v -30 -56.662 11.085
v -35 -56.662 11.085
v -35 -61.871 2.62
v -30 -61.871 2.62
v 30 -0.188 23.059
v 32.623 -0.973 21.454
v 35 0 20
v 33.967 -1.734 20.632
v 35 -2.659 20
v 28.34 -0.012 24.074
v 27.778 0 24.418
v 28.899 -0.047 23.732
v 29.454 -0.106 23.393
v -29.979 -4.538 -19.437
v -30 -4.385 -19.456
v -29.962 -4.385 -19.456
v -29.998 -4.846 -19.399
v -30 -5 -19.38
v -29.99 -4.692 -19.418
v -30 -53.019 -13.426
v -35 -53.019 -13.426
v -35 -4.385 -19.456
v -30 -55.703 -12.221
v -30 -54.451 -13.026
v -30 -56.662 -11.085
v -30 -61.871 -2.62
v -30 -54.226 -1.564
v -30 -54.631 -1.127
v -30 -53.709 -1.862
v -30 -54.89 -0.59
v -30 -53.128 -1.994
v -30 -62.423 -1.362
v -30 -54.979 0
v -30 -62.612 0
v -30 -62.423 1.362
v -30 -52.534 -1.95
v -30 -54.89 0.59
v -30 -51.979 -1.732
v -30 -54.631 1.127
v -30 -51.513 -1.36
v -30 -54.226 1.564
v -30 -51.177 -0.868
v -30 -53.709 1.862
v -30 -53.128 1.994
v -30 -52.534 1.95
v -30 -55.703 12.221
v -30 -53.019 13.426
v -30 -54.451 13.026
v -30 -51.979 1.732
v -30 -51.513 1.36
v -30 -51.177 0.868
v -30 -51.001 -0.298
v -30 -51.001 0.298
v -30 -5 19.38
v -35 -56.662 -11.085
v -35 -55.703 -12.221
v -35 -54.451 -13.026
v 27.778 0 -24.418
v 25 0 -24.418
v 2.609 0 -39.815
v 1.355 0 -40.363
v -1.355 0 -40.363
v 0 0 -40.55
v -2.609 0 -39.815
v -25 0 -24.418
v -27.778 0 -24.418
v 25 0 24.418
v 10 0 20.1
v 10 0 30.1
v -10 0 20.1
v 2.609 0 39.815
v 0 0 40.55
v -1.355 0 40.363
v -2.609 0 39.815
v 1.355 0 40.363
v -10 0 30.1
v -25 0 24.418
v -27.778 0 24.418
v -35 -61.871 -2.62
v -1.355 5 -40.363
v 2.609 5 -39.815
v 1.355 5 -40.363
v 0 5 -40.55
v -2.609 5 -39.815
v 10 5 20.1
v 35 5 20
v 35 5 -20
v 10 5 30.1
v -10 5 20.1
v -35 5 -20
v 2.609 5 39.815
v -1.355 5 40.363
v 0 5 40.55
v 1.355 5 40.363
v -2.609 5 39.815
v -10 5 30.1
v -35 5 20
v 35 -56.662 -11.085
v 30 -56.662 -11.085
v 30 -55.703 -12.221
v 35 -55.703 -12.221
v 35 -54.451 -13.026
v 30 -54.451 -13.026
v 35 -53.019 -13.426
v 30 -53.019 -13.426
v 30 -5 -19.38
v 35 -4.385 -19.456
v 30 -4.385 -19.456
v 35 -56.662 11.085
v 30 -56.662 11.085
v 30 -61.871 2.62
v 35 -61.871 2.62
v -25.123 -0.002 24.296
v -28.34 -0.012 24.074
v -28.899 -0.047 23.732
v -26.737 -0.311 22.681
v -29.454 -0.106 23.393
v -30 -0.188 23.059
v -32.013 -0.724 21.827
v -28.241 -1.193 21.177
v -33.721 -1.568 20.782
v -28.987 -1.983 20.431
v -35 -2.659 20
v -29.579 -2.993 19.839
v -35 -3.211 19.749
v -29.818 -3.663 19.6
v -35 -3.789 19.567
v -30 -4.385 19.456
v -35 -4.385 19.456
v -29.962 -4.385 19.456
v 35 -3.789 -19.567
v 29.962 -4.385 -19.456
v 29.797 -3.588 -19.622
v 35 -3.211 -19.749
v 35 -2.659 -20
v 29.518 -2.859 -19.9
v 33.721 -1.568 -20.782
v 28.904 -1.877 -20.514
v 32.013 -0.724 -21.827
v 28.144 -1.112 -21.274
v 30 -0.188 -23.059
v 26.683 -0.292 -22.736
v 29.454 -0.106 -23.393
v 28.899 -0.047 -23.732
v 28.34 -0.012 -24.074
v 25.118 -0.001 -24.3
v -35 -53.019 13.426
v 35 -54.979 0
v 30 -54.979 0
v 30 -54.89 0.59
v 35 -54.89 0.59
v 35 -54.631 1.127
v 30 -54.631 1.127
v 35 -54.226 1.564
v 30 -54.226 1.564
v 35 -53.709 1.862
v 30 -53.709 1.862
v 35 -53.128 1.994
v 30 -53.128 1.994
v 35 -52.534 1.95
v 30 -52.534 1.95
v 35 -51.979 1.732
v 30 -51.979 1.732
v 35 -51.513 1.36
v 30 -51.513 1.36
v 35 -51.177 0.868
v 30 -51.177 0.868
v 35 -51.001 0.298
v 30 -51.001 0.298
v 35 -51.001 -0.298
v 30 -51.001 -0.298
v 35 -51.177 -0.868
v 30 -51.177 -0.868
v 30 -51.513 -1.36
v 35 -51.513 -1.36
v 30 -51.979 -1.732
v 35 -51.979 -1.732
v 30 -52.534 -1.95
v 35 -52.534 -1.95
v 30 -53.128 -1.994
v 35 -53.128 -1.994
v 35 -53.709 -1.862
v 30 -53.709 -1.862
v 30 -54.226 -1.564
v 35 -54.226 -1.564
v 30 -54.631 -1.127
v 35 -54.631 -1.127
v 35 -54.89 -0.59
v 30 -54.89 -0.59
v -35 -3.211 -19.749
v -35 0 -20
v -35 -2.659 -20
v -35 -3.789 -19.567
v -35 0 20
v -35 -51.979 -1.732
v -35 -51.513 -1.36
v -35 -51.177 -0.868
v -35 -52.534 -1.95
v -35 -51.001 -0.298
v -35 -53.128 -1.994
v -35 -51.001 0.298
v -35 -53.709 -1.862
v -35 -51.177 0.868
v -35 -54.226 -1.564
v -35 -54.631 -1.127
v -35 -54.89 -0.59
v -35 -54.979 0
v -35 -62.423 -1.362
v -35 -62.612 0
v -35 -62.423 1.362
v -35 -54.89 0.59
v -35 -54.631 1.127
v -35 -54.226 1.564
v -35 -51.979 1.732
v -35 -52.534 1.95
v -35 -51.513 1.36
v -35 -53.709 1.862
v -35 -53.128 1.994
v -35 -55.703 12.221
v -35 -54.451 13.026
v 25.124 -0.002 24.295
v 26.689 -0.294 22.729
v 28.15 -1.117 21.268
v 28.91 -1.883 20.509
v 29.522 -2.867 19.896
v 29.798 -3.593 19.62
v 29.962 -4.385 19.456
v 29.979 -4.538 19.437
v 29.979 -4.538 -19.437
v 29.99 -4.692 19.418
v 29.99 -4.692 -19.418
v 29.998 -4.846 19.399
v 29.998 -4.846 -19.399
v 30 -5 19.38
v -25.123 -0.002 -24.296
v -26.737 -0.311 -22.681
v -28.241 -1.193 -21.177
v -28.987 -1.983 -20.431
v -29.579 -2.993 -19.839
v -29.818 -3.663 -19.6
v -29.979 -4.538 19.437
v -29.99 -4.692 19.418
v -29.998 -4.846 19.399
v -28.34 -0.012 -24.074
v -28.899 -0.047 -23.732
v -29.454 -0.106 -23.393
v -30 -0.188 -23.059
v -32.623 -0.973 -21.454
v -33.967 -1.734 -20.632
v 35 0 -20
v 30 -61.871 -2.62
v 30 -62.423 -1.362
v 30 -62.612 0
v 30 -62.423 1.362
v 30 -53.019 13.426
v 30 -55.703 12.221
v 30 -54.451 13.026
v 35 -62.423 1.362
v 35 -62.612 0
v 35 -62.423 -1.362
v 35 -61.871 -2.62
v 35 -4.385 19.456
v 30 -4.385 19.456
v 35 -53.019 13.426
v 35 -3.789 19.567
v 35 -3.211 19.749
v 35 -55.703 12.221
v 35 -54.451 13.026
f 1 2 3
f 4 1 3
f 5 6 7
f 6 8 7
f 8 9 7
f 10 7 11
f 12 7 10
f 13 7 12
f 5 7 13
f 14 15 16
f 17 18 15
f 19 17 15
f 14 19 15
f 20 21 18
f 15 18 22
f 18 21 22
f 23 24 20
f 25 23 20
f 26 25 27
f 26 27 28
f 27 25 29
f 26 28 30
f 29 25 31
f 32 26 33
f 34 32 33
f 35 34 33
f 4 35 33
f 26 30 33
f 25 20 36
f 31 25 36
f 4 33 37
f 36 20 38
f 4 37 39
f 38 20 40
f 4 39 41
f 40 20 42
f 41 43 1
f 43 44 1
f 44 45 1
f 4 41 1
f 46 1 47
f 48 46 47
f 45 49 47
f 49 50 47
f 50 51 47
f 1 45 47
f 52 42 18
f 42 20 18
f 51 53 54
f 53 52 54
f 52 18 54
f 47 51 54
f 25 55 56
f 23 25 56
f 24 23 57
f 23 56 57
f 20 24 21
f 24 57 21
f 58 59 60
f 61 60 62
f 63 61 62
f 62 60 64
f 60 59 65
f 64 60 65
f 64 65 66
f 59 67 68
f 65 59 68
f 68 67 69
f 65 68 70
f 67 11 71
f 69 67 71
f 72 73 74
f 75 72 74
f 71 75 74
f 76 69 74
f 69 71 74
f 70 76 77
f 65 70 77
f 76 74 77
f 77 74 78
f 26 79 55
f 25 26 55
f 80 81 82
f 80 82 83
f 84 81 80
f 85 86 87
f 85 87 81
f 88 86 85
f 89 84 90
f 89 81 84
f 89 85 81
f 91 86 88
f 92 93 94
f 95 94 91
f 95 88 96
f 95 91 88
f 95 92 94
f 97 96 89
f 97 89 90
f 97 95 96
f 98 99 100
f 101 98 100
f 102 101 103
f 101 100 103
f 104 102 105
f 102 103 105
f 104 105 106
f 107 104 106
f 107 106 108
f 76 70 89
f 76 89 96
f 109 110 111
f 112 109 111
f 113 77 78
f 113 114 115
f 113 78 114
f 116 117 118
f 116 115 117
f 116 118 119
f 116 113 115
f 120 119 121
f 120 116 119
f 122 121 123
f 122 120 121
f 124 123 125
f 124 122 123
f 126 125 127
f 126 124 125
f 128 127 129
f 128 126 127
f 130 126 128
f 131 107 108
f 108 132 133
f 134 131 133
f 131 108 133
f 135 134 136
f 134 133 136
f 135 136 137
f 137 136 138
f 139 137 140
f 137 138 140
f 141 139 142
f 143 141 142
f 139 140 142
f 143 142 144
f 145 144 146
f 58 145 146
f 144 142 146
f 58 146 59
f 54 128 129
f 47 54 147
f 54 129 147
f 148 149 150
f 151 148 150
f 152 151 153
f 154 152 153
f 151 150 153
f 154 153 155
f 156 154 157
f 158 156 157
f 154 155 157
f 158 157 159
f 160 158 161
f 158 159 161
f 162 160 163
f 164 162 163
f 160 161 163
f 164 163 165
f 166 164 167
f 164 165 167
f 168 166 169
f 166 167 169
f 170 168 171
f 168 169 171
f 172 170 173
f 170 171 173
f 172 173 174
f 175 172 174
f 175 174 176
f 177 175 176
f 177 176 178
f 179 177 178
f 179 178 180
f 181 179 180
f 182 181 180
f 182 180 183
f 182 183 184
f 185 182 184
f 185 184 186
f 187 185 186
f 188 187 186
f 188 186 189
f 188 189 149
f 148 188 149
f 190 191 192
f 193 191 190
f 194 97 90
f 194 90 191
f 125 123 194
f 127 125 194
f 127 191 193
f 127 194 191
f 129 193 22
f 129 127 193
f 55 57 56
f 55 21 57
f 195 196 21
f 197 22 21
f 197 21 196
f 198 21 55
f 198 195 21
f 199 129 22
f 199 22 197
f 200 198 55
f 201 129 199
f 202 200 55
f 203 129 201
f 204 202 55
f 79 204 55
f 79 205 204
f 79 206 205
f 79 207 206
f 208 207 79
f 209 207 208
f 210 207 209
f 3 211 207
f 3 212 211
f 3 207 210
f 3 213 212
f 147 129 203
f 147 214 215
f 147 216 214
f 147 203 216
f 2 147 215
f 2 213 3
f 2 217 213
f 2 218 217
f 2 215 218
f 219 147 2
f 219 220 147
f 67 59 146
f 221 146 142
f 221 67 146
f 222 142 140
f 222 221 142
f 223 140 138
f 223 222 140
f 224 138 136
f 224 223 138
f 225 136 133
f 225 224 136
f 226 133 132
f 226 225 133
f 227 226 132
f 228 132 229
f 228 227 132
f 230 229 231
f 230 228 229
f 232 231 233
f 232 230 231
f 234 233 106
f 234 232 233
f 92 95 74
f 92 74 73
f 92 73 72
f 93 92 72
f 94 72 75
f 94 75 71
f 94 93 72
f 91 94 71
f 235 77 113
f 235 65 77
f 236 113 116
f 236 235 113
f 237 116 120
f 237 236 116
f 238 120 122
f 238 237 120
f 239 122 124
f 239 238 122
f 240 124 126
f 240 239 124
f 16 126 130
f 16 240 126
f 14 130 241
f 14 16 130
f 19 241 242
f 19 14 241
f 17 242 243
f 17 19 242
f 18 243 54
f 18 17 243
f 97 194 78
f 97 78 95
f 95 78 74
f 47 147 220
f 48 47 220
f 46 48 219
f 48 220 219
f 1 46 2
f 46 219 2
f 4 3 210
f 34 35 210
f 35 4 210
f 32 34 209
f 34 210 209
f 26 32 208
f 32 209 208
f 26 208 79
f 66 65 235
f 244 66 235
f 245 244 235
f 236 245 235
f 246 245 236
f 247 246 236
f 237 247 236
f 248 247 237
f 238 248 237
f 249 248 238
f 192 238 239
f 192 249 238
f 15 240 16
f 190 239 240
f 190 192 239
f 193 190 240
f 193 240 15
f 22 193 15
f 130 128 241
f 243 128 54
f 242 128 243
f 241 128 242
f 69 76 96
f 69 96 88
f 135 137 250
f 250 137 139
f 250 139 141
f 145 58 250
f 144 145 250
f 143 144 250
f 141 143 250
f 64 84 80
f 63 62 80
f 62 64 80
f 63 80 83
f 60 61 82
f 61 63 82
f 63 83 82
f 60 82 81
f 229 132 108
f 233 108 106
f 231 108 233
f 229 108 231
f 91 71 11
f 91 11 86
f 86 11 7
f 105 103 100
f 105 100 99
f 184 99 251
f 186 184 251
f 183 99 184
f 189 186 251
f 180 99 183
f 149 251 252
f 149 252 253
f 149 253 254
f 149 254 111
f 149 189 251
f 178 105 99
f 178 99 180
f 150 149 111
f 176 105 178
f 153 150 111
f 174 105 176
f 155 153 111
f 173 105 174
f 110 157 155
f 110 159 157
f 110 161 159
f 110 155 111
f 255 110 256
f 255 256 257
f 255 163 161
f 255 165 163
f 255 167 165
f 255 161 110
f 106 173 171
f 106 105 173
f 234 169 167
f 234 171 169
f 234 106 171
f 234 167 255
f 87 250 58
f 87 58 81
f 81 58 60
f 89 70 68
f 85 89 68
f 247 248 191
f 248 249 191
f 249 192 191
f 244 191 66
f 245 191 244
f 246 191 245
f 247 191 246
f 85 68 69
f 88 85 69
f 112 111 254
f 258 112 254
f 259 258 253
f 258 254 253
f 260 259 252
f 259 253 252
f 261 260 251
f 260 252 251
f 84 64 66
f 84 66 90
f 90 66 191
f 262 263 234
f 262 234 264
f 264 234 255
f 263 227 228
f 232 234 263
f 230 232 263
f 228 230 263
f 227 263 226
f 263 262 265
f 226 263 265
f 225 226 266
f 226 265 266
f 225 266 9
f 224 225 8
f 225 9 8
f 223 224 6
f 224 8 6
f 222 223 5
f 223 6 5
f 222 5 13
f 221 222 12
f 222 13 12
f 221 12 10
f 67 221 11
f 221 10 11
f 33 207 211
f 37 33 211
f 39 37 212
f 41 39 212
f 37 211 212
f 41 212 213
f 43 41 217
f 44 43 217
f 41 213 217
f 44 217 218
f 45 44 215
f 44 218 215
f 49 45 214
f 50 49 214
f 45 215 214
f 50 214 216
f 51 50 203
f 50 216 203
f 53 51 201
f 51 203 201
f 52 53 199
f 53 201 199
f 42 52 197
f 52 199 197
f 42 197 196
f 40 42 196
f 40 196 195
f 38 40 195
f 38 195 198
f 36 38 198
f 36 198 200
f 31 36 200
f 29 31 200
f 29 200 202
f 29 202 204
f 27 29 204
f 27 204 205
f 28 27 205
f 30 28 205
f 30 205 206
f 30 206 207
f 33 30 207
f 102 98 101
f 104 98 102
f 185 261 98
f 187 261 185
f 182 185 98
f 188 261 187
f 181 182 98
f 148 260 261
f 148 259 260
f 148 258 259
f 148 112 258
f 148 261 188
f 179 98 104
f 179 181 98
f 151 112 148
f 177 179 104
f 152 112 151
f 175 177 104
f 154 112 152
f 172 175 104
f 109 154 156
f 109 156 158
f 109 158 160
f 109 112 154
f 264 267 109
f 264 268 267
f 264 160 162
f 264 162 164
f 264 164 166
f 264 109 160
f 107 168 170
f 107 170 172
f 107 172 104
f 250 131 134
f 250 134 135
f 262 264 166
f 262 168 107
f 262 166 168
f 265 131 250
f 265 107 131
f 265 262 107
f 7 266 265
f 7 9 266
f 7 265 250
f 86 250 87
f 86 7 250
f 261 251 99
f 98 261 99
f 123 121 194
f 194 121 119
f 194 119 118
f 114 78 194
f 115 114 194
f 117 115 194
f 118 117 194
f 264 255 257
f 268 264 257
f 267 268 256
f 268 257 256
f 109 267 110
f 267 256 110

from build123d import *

# Parameters (mm, degrees)
F0_W         = 5
F0_H         = 40
F1_DEPTH     = 70
F3_DEPTH     = 5
F4_R         = 2
F5_DEPTH     = 97.2
F7_DEPTH     = 83.6
F8_T4_DEPTH  = 65
F8_T10_DEPTH = 65
F8_T16_DEPTH = 5
F8_T21_DEPTH = 5
F8_T26_DEPTH = 5
F8_T31_DEPTH = 5
F8_T37_DEPTH = 16.0458347789
F8_T42_DEPTH = 65
F8_T50_DEPTH = 16.0458347789
F8_T55_DEPTH = 65
F8_T63_DEPTH = 16.0458347789
F8_T68_DEPTH = 65
F8_T76_DEPTH = 65
F8_T81_DEPTH = 16.0458347789
F8_T85_DEPTH = 20.294112478
F9_W         = 20
F9_H         = 10
F10_DEPTH    = 25


# Not quite as in the source:
# - a fillet or chamfer that OpenCascade refuses, or shapes differently, is made with other operations: its cross-section is extruded or revolved along the edge and cut away or added


with BuildPart() as f1:
    # F0 (on Front) → F1 (new body)
    with BuildSketch(Plane.XZ):
        with Locations((-32.5, 0)):
            Rectangle(F0_W, F0_H)
    extrude(amount=F1_DEPTH)



with BuildPart() as f1b:
    # F0 (on Front) → F1, piece 2 (new body)
    with BuildSketch(Plane.XZ):
        with Locations((32.5, 0)):
            Rectangle(F0_W, F0_H)
    extrude(amount=F1_DEPTH)


with BuildPart() as f1_1:
    add(f1.part)

    add(f1b.part)  # F3 merges F1b
    # F2 (on face) → F3 (join)
    with BuildSketch(Plane(origin=(0, 0, 0), x_dir=(-1, 0, 0), z_dir=(0, 1, 0))):
        Polygon((-35, -20), (0, -41.4117574692), (35, -20), (35, 20), (0, 41.4117574692), (-35, 20), align=None)
    extrude(amount=F3_DEPTH)

    # F4 (on face) → F5 (cut)
    with BuildSketch(Plane(origin=(-35, 0, 0), x_dir=(0, -1, 0), z_dir=(-1, 0, 0))):
        with Locations((52.9787652194, 0)):
            Circle(F4_R)
    extrude(amount=-F5_DEPTH, mode=Mode.SUBTRACT)

    # F6 (on face) → F7 (cut)
    with BuildSketch(Plane(origin=(-35, 0, 0), x_dir=(0, -1, 0), z_dir=(-1, 0, 0))):
        with BuildLine():
            Line((98.4306931496, 40.8057309687), (0, 20))
            Line((0, 20), (53.01884554, 13.4261534673))
            ThreePointArc((53.01884554, 13.4261534673), (55.107028482, 12.6702755654), (56.6618948527, 11.084636902))
            Line((56.6618948527, 11.084636902), (61.8706015463, 2.6204867239))
            ThreePointArc((61.8706015463, 2.6204867239), (62.6123097139, 0), (61.8706015463, -2.6204867239))
            Line((61.8706015463, -2.6204867239), (56.6618948527, -11.084636902))
            ThreePointArc((56.6618948527, -11.084636902), (55.107028482, -12.6702755654), (53.01884554, -13.4261534673))
            Line((53.01884554, -13.4261534673), (0, -20))
            Line((0, -20), (98.4306931496, -42.0177839696))
            Line((98.4306931496, -42.0177839696), (98.4306931496, 40.8057309687))
        make_face()
    extrude(amount=-F7_DEPTH, mode=Mode.SUBTRACT)

    # F8: fillet of radius 5 on 8 edges, made by hand


with BuildPart() as f8_tool2:
    # F8_s3 → F8_t4 (new body)
    with BuildSketch(Plane.XY.offset(32.5)):
        with BuildLine():
            ThreePointArc((25, 0), (28.5355339059, -1.4644660941), (30, -5))
            Line((30, -5), (30, 0))
            Line((30, 0), (25, 0))
        make_face()
    extrude(amount=-F8_T4_DEPTH)

    split(bisect_by=Plane(origin=(0, -2.4422683248, 19.6971813136), x_dir=(1, 0, 0), z_dir=(0, 0.1230485039, -0.9924006578)), keep=Keep.TOP)

    split(bisect_by=Plane(origin=(0, -2.4422683248, -19.6971813136), x_dir=(1, 0, 0), z_dir=(0, 0.1230485039, 0.9924006578)), keep=Keep.TOP)


with BuildPart() as f1_2:
    add(f1_1.part)

    # F8_t1: union F8_tool2
    add(f8_tool2.part)


with BuildPart() as f8_tool8:
    # F8_s9 → F8_t10 (new body)
    with BuildSketch(Plane.XY.offset(-32.5)):
        with BuildLine():
            ThreePointArc((-25, 0), (-28.5355339059, -1.4644660941), (-30, -5))
            Line((-30, -5), (-30, 0))
            Line((-30, 0), (-25, 0))
        make_face()
    extrude(amount=F8_T10_DEPTH)

    split(bisect_by=Plane(origin=(0, -2.4422683248, -19.6971813136), x_dir=(1, 0, 0), z_dir=(0, 0.1230485039, 0.9924006578)), keep=Keep.TOP)

    split(bisect_by=Plane(origin=(0, -2.4422683248, 19.6971813136), x_dir=(1, 0, 0), z_dir=(0, 0.1230485039, -0.9924006578)), keep=Keep.TOP)


with BuildPart() as f1_3:
    add(f1_2.part)

    # F8_t7: union F8_tool8
    add(f8_tool8.part)


with BuildPart() as f8_tool14:
    # F8_s15 → F8_t16 (new body)
    with BuildSketch(Plane.YZ.offset(35)):
        with BuildLine():
            ThreePointArc((-4.3847574804, 19.4563306223), (-1.2532539052, 21.1074588458), (0, 24.4183339115))
            Line((0, 24.4183339115), (0, 20))
            Line((0, 20), (-4.3847574804, 19.4563306223))
        make_face()
    extrude(amount=-F8_T16_DEPTH)

    split(bisect_by=Plane(origin=(18.4348816442, 0, 30.1339513338), x_dir=(0, 1, 0), z_dir=(-0.5218557601, 0, -0.8530337424)), keep=Keep.TOP)


with BuildPart() as f1_4:
    add(f1_3.part)

    # F8_t13: union F8_tool14
    add(f8_tool14.part)


with BuildPart() as f8_tool19:
    # F8_s20 → F8_t21 (new body)
    with BuildSketch(Plane.YZ.offset(-30)):
        with BuildLine():
            ThreePointArc((0, 24.4183339115), (-1.2532539052, 21.1074588458), (-4.3847574804, 19.4563306223))
            Line((-4.3847574804, 19.4563306223), (0, 20))
            Line((0, 20), (0, 24.4183339115))
        make_face()
    extrude(amount=-F8_T21_DEPTH)

    split(bisect_by=Plane(origin=(-18.4348816442, 0, 30.1339513338), x_dir=(0, 1, 0), z_dir=(0.5218557601, 0, -0.8530337424)), keep=Keep.TOP)


with BuildPart() as f1_5:
    add(f1_4.part)

    # F8_t18: union F8_tool19
    add(f8_tool19.part)


with BuildPart() as f8_tool24:
    # F8_s25 → F8_t26 (new body)
    with BuildSketch(Plane.YZ.offset(-35)):
        with BuildLine():
            ThreePointArc((0, -24.4183339115), (-1.2532539052, -21.1074588458), (-4.3847574804, -19.4563306223))
            Line((-4.3847574804, -19.4563306223), (0, -20))
            Line((0, -20), (0, -24.4183339115))
        make_face()
    extrude(amount=F8_T26_DEPTH)

    split(bisect_by=Plane(origin=(-18.4348816442, 0, -30.1339513338), x_dir=(0, 1, 0), z_dir=(0.5218557601, 0, 0.8530337424)), keep=Keep.TOP)


with BuildPart() as f1_6:
    add(f1_5.part)

    # F8_t23: union F8_tool24
    add(f8_tool24.part)


with BuildPart() as f8_tool29:
    # F8_s30 → F8_t31 (new body)
    with BuildSketch(Plane.YZ.offset(30)):
        with BuildLine():
            ThreePointArc((-4.3847574804, -19.4563306223), (-1.2532539052, -21.1074588458), (0, -24.4183339115))
            Line((0, -24.4183339115), (0, -20))
            Line((0, -20), (-4.3847574804, -19.4563306223))
        make_face()
    extrude(amount=F8_T31_DEPTH)

    split(bisect_by=Plane(origin=(18.4348816442, 0, -30.1339513338), x_dir=(0, 1, 0), z_dir=(-0.5218557601, 0, 0.8530337424)), keep=Keep.TOP)


with BuildPart() as f1_7:
    add(f1_6.part)

    # F8_t28: union F8_tool29
    add(f8_tool29.part)


with BuildPart() as f8_tool35:
    # F8_s36 → F8_t37 (new body)
    with BuildSketch(Plane.YZ.offset(35)):
        with BuildLine():
            ThreePointArc((-4.3847574804, 19.4563306223), (-1.2532539052, 21.1074588458), (0, 24.4183339115))
            Line((0, 24.4183339115), (0, 20))
            Line((0, 20), (-4.3847574804, 19.4563306223))
        make_face()
    extrude(amount=-F8_T37_DEPTH)

    split(bisect_by=Plane(origin=(18.4348816442, 0, 30.1339513338), x_dir=(0, 1, 0), z_dir=(-0.5218557601, 0, -0.8530337424)), keep=Keep.TOP)

    split(bisect_by=Plane.YZ.offset(30), keep=Keep.BOTTOM)


with BuildPart() as f8_tool40:
    # F8_s41 → F8_t42 (new body)
    with BuildSketch(Plane.XY.offset(32.5)):
        with BuildLine():
            ThreePointArc((25, 0), (28.5355339059, -1.4644660941), (30, -5))
            Line((30, -5), (30, 0))
            Line((30, 0), (25, 0))
        make_face()
    extrude(amount=-F8_T42_DEPTH)

    split(bisect_by=Plane(origin=(18.4348816442, 0, 30.1339513338), x_dir=(0, 1, 0), z_dir=(-0.5218557601, 0, -0.8530337424)), keep=Keep.TOP)

    split(bisect_by=Plane(origin=(0, -2.4422683248, 19.6971813136), x_dir=(1, 0, 0), z_dir=(0, -0.1230485039, 0.9924006578)), keep=Keep.TOP)


with BuildPart() as f8_tool35_1:
    add(f8_tool35.part)

    # F8_t45: intersect F8_tool40
    add(f8_tool40.part, mode=Mode.INTERSECT)


with BuildPart() as f1_8:
    add(f1_7.part)

    # F8_t33: union F8_tool35
    add(f8_tool35_1.part)


with BuildPart() as f8_tool48:
    # F8_s49 → F8_t50 (new body)
    with BuildSketch(Plane.YZ.offset(18.9541652211)):
        with BuildLine():
            ThreePointArc((-4.3847574804, -19.4563306223), (-1.2532539052, -21.1074588458), (0, -24.4183339115))
            Line((0, -24.4183339115), (0, -20))
            Line((0, -20), (-4.3847574804, -19.4563306223))
        make_face()
    extrude(amount=F8_T50_DEPTH)

    split(bisect_by=Plane(origin=(18.4348816442, 0, -30.1339513338), x_dir=(0, 1, 0), z_dir=(-0.5218557601, 0, 0.8530337424)), keep=Keep.TOP)

    split(bisect_by=Plane.YZ.offset(30), keep=Keep.BOTTOM)


with BuildPart() as f8_tool53:
    # F8_s54 → F8_t55 (new body)
    with BuildSketch(Plane.XY.offset(32.5)):
        with BuildLine():
            ThreePointArc((25, 0), (28.5355339059, -1.4644660941), (30, -5))
            Line((30, -5), (30, 0))
            Line((30, 0), (25, 0))
        make_face()
    extrude(amount=-F8_T55_DEPTH)

    split(bisect_by=Plane(origin=(18.4348816442, 0, -30.1339513338), x_dir=(0, 1, 0), z_dir=(-0.5218557601, 0, 0.8530337424)), keep=Keep.TOP)

    split(bisect_by=Plane(origin=(0, -2.4422683248, -19.6971813136), x_dir=(1, 0, 0), z_dir=(0, -0.1230485039, -0.9924006578)), keep=Keep.TOP)


with BuildPart() as f8_tool48_1:
    add(f8_tool48.part)

    # F8_t58: intersect F8_tool53
    add(f8_tool53.part, mode=Mode.INTERSECT)


with BuildPart() as f1_9:
    add(f1_8.part)

    # F8_t46: union F8_tool48
    add(f8_tool48_1.part)


with BuildPart() as f8_tool61:
    # F8_s62 → F8_t63 (new body)
    with BuildSketch(Plane.YZ.offset(-35)):
        with BuildLine():
            ThreePointArc((0, -24.4183339115), (-1.2532539052, -21.1074588458), (-4.3847574804, -19.4563306223))
            Line((-4.3847574804, -19.4563306223), (0, -20))
            Line((0, -20), (0, -24.4183339115))
        make_face()
    extrude(amount=F8_T63_DEPTH)

    split(bisect_by=Plane(origin=(-18.4348816442, 0, -30.1339513338), x_dir=(0, 1, 0), z_dir=(0.5218557601, 0, 0.8530337424)), keep=Keep.TOP)

    split(bisect_by=Plane.YZ.offset(-30), keep=Keep.TOP)


with BuildPart() as f8_tool66:
    # F8_s67 → F8_t68 (new body)
    with BuildSketch(Plane.XY.offset(-32.5)):
        with BuildLine():
            ThreePointArc((-25, 0), (-28.5355339059, -1.4644660941), (-30, -5))
            Line((-30, -5), (-30, 0))
            Line((-30, 0), (-25, 0))
        make_face()
    extrude(amount=F8_T68_DEPTH)

    split(bisect_by=Plane(origin=(-18.4348816442, 0, -30.1339513338), x_dir=(0, 1, 0), z_dir=(0.5218557601, 0, 0.8530337424)), keep=Keep.TOP)

    split(bisect_by=Plane(origin=(0, -2.4422683248, -19.6971813136), x_dir=(1, 0, 0), z_dir=(0, -0.1230485039, -0.9924006578)), keep=Keep.TOP)


with BuildPart() as f8_tool61_1:
    add(f8_tool61.part)

    # F8_t71: intersect F8_tool66
    add(f8_tool66.part, mode=Mode.INTERSECT)


with BuildPart() as f1_10:
    add(f1_9.part)

    # F8_t59: union F8_tool61
    add(f8_tool61_1.part)


with BuildPart() as f8_tool74:
    # F8_s75 → F8_t76 (new body)
    with BuildSketch(Plane.XY.offset(-32.5)):
        with BuildLine():
            ThreePointArc((-25, 0), (-28.5355339059, -1.4644660941), (-30, -5))
            Line((-30, -5), (-30, 0))
            Line((-30, 0), (-25, 0))
        make_face()
    extrude(amount=F8_T76_DEPTH)

    split(bisect_by=Plane(origin=(-18.4348816442, 0, 30.1339513338), x_dir=(0, 1, 0), z_dir=(0.5218557601, 0, -0.8530337424)), keep=Keep.TOP)

    split(bisect_by=Plane(origin=(0, -2.4422683248, 19.6971813136), x_dir=(1, 0, 0), z_dir=(0, -0.1230485039, 0.9924006578)), keep=Keep.TOP)


with BuildPart() as f8_tool79:
    # F8_s80 → F8_t81 (new body)
    with BuildSketch(Plane.YZ.offset(-18.9541652211)):
        with BuildLine():
            ThreePointArc((0, 24.4183339115), (-1.2532539052, 21.1074588458), (-4.3847574804, 19.4563306223))
            Line((-4.3847574804, 19.4563306223), (0, 20))
            Line((0, 20), (0, 24.4183339115))
        make_face()
    extrude(amount=-F8_T81_DEPTH)

    split(bisect_by=Plane(origin=(-18.4348816442, 0, 30.1339513338), x_dir=(0, 1, 0), z_dir=(0.5218557601, 0, -0.8530337424)), keep=Keep.TOP)

    split(bisect_by=Plane.YZ.offset(-30), keep=Keep.TOP)


with BuildPart() as f8_tool74_1:
    add(f8_tool74.part)

    # F8_t84: intersect F8_tool79
    add(f8_tool79.part, mode=Mode.INTERSECT)


with BuildPart() as f1_11:
    add(f1_10.part)

    # F8_t72: union F8_tool74
    add(f8_tool74_1.part)

    # F8_s86 → F8_t85 (cut)
    with BuildSketch(Plane.XZ.offset(-12.647056239)):
        with BuildLine():
            ThreePointArc((-2.6092788007, 39.8154933306), (0, 40.5503246188), (2.6092788007, 39.8154933306))
            Line((2.6092788007, 39.8154933306), (0, 41.4117574692))
            Line((0, 41.4117574692), (-2.6092788007, 39.8154933306))
        make_face()
        with BuildLine():
            ThreePointArc((-2.6092788007, -39.8154933306), (0, -40.5503246188), (2.6092788007, -39.8154933306))
            Line((2.6092788007, -39.8154933306), (0, -41.4117574692))
            Line((0, -41.4117574692), (-2.6092788007, -39.8154933306))
        make_face()
    extrude(amount=F8_T85_DEPTH, mode=Mode.SUBTRACT)

    # F9 (on face) → F10 (cut)
    with BuildSketch(Plane.XZ):
        with Locations((0, 25.0998503715)):
            Rectangle(F9_W, F9_H)
    extrude(amount=-F10_DEPTH, mode=Mode.SUBTRACT)


solid = f1_11.part
